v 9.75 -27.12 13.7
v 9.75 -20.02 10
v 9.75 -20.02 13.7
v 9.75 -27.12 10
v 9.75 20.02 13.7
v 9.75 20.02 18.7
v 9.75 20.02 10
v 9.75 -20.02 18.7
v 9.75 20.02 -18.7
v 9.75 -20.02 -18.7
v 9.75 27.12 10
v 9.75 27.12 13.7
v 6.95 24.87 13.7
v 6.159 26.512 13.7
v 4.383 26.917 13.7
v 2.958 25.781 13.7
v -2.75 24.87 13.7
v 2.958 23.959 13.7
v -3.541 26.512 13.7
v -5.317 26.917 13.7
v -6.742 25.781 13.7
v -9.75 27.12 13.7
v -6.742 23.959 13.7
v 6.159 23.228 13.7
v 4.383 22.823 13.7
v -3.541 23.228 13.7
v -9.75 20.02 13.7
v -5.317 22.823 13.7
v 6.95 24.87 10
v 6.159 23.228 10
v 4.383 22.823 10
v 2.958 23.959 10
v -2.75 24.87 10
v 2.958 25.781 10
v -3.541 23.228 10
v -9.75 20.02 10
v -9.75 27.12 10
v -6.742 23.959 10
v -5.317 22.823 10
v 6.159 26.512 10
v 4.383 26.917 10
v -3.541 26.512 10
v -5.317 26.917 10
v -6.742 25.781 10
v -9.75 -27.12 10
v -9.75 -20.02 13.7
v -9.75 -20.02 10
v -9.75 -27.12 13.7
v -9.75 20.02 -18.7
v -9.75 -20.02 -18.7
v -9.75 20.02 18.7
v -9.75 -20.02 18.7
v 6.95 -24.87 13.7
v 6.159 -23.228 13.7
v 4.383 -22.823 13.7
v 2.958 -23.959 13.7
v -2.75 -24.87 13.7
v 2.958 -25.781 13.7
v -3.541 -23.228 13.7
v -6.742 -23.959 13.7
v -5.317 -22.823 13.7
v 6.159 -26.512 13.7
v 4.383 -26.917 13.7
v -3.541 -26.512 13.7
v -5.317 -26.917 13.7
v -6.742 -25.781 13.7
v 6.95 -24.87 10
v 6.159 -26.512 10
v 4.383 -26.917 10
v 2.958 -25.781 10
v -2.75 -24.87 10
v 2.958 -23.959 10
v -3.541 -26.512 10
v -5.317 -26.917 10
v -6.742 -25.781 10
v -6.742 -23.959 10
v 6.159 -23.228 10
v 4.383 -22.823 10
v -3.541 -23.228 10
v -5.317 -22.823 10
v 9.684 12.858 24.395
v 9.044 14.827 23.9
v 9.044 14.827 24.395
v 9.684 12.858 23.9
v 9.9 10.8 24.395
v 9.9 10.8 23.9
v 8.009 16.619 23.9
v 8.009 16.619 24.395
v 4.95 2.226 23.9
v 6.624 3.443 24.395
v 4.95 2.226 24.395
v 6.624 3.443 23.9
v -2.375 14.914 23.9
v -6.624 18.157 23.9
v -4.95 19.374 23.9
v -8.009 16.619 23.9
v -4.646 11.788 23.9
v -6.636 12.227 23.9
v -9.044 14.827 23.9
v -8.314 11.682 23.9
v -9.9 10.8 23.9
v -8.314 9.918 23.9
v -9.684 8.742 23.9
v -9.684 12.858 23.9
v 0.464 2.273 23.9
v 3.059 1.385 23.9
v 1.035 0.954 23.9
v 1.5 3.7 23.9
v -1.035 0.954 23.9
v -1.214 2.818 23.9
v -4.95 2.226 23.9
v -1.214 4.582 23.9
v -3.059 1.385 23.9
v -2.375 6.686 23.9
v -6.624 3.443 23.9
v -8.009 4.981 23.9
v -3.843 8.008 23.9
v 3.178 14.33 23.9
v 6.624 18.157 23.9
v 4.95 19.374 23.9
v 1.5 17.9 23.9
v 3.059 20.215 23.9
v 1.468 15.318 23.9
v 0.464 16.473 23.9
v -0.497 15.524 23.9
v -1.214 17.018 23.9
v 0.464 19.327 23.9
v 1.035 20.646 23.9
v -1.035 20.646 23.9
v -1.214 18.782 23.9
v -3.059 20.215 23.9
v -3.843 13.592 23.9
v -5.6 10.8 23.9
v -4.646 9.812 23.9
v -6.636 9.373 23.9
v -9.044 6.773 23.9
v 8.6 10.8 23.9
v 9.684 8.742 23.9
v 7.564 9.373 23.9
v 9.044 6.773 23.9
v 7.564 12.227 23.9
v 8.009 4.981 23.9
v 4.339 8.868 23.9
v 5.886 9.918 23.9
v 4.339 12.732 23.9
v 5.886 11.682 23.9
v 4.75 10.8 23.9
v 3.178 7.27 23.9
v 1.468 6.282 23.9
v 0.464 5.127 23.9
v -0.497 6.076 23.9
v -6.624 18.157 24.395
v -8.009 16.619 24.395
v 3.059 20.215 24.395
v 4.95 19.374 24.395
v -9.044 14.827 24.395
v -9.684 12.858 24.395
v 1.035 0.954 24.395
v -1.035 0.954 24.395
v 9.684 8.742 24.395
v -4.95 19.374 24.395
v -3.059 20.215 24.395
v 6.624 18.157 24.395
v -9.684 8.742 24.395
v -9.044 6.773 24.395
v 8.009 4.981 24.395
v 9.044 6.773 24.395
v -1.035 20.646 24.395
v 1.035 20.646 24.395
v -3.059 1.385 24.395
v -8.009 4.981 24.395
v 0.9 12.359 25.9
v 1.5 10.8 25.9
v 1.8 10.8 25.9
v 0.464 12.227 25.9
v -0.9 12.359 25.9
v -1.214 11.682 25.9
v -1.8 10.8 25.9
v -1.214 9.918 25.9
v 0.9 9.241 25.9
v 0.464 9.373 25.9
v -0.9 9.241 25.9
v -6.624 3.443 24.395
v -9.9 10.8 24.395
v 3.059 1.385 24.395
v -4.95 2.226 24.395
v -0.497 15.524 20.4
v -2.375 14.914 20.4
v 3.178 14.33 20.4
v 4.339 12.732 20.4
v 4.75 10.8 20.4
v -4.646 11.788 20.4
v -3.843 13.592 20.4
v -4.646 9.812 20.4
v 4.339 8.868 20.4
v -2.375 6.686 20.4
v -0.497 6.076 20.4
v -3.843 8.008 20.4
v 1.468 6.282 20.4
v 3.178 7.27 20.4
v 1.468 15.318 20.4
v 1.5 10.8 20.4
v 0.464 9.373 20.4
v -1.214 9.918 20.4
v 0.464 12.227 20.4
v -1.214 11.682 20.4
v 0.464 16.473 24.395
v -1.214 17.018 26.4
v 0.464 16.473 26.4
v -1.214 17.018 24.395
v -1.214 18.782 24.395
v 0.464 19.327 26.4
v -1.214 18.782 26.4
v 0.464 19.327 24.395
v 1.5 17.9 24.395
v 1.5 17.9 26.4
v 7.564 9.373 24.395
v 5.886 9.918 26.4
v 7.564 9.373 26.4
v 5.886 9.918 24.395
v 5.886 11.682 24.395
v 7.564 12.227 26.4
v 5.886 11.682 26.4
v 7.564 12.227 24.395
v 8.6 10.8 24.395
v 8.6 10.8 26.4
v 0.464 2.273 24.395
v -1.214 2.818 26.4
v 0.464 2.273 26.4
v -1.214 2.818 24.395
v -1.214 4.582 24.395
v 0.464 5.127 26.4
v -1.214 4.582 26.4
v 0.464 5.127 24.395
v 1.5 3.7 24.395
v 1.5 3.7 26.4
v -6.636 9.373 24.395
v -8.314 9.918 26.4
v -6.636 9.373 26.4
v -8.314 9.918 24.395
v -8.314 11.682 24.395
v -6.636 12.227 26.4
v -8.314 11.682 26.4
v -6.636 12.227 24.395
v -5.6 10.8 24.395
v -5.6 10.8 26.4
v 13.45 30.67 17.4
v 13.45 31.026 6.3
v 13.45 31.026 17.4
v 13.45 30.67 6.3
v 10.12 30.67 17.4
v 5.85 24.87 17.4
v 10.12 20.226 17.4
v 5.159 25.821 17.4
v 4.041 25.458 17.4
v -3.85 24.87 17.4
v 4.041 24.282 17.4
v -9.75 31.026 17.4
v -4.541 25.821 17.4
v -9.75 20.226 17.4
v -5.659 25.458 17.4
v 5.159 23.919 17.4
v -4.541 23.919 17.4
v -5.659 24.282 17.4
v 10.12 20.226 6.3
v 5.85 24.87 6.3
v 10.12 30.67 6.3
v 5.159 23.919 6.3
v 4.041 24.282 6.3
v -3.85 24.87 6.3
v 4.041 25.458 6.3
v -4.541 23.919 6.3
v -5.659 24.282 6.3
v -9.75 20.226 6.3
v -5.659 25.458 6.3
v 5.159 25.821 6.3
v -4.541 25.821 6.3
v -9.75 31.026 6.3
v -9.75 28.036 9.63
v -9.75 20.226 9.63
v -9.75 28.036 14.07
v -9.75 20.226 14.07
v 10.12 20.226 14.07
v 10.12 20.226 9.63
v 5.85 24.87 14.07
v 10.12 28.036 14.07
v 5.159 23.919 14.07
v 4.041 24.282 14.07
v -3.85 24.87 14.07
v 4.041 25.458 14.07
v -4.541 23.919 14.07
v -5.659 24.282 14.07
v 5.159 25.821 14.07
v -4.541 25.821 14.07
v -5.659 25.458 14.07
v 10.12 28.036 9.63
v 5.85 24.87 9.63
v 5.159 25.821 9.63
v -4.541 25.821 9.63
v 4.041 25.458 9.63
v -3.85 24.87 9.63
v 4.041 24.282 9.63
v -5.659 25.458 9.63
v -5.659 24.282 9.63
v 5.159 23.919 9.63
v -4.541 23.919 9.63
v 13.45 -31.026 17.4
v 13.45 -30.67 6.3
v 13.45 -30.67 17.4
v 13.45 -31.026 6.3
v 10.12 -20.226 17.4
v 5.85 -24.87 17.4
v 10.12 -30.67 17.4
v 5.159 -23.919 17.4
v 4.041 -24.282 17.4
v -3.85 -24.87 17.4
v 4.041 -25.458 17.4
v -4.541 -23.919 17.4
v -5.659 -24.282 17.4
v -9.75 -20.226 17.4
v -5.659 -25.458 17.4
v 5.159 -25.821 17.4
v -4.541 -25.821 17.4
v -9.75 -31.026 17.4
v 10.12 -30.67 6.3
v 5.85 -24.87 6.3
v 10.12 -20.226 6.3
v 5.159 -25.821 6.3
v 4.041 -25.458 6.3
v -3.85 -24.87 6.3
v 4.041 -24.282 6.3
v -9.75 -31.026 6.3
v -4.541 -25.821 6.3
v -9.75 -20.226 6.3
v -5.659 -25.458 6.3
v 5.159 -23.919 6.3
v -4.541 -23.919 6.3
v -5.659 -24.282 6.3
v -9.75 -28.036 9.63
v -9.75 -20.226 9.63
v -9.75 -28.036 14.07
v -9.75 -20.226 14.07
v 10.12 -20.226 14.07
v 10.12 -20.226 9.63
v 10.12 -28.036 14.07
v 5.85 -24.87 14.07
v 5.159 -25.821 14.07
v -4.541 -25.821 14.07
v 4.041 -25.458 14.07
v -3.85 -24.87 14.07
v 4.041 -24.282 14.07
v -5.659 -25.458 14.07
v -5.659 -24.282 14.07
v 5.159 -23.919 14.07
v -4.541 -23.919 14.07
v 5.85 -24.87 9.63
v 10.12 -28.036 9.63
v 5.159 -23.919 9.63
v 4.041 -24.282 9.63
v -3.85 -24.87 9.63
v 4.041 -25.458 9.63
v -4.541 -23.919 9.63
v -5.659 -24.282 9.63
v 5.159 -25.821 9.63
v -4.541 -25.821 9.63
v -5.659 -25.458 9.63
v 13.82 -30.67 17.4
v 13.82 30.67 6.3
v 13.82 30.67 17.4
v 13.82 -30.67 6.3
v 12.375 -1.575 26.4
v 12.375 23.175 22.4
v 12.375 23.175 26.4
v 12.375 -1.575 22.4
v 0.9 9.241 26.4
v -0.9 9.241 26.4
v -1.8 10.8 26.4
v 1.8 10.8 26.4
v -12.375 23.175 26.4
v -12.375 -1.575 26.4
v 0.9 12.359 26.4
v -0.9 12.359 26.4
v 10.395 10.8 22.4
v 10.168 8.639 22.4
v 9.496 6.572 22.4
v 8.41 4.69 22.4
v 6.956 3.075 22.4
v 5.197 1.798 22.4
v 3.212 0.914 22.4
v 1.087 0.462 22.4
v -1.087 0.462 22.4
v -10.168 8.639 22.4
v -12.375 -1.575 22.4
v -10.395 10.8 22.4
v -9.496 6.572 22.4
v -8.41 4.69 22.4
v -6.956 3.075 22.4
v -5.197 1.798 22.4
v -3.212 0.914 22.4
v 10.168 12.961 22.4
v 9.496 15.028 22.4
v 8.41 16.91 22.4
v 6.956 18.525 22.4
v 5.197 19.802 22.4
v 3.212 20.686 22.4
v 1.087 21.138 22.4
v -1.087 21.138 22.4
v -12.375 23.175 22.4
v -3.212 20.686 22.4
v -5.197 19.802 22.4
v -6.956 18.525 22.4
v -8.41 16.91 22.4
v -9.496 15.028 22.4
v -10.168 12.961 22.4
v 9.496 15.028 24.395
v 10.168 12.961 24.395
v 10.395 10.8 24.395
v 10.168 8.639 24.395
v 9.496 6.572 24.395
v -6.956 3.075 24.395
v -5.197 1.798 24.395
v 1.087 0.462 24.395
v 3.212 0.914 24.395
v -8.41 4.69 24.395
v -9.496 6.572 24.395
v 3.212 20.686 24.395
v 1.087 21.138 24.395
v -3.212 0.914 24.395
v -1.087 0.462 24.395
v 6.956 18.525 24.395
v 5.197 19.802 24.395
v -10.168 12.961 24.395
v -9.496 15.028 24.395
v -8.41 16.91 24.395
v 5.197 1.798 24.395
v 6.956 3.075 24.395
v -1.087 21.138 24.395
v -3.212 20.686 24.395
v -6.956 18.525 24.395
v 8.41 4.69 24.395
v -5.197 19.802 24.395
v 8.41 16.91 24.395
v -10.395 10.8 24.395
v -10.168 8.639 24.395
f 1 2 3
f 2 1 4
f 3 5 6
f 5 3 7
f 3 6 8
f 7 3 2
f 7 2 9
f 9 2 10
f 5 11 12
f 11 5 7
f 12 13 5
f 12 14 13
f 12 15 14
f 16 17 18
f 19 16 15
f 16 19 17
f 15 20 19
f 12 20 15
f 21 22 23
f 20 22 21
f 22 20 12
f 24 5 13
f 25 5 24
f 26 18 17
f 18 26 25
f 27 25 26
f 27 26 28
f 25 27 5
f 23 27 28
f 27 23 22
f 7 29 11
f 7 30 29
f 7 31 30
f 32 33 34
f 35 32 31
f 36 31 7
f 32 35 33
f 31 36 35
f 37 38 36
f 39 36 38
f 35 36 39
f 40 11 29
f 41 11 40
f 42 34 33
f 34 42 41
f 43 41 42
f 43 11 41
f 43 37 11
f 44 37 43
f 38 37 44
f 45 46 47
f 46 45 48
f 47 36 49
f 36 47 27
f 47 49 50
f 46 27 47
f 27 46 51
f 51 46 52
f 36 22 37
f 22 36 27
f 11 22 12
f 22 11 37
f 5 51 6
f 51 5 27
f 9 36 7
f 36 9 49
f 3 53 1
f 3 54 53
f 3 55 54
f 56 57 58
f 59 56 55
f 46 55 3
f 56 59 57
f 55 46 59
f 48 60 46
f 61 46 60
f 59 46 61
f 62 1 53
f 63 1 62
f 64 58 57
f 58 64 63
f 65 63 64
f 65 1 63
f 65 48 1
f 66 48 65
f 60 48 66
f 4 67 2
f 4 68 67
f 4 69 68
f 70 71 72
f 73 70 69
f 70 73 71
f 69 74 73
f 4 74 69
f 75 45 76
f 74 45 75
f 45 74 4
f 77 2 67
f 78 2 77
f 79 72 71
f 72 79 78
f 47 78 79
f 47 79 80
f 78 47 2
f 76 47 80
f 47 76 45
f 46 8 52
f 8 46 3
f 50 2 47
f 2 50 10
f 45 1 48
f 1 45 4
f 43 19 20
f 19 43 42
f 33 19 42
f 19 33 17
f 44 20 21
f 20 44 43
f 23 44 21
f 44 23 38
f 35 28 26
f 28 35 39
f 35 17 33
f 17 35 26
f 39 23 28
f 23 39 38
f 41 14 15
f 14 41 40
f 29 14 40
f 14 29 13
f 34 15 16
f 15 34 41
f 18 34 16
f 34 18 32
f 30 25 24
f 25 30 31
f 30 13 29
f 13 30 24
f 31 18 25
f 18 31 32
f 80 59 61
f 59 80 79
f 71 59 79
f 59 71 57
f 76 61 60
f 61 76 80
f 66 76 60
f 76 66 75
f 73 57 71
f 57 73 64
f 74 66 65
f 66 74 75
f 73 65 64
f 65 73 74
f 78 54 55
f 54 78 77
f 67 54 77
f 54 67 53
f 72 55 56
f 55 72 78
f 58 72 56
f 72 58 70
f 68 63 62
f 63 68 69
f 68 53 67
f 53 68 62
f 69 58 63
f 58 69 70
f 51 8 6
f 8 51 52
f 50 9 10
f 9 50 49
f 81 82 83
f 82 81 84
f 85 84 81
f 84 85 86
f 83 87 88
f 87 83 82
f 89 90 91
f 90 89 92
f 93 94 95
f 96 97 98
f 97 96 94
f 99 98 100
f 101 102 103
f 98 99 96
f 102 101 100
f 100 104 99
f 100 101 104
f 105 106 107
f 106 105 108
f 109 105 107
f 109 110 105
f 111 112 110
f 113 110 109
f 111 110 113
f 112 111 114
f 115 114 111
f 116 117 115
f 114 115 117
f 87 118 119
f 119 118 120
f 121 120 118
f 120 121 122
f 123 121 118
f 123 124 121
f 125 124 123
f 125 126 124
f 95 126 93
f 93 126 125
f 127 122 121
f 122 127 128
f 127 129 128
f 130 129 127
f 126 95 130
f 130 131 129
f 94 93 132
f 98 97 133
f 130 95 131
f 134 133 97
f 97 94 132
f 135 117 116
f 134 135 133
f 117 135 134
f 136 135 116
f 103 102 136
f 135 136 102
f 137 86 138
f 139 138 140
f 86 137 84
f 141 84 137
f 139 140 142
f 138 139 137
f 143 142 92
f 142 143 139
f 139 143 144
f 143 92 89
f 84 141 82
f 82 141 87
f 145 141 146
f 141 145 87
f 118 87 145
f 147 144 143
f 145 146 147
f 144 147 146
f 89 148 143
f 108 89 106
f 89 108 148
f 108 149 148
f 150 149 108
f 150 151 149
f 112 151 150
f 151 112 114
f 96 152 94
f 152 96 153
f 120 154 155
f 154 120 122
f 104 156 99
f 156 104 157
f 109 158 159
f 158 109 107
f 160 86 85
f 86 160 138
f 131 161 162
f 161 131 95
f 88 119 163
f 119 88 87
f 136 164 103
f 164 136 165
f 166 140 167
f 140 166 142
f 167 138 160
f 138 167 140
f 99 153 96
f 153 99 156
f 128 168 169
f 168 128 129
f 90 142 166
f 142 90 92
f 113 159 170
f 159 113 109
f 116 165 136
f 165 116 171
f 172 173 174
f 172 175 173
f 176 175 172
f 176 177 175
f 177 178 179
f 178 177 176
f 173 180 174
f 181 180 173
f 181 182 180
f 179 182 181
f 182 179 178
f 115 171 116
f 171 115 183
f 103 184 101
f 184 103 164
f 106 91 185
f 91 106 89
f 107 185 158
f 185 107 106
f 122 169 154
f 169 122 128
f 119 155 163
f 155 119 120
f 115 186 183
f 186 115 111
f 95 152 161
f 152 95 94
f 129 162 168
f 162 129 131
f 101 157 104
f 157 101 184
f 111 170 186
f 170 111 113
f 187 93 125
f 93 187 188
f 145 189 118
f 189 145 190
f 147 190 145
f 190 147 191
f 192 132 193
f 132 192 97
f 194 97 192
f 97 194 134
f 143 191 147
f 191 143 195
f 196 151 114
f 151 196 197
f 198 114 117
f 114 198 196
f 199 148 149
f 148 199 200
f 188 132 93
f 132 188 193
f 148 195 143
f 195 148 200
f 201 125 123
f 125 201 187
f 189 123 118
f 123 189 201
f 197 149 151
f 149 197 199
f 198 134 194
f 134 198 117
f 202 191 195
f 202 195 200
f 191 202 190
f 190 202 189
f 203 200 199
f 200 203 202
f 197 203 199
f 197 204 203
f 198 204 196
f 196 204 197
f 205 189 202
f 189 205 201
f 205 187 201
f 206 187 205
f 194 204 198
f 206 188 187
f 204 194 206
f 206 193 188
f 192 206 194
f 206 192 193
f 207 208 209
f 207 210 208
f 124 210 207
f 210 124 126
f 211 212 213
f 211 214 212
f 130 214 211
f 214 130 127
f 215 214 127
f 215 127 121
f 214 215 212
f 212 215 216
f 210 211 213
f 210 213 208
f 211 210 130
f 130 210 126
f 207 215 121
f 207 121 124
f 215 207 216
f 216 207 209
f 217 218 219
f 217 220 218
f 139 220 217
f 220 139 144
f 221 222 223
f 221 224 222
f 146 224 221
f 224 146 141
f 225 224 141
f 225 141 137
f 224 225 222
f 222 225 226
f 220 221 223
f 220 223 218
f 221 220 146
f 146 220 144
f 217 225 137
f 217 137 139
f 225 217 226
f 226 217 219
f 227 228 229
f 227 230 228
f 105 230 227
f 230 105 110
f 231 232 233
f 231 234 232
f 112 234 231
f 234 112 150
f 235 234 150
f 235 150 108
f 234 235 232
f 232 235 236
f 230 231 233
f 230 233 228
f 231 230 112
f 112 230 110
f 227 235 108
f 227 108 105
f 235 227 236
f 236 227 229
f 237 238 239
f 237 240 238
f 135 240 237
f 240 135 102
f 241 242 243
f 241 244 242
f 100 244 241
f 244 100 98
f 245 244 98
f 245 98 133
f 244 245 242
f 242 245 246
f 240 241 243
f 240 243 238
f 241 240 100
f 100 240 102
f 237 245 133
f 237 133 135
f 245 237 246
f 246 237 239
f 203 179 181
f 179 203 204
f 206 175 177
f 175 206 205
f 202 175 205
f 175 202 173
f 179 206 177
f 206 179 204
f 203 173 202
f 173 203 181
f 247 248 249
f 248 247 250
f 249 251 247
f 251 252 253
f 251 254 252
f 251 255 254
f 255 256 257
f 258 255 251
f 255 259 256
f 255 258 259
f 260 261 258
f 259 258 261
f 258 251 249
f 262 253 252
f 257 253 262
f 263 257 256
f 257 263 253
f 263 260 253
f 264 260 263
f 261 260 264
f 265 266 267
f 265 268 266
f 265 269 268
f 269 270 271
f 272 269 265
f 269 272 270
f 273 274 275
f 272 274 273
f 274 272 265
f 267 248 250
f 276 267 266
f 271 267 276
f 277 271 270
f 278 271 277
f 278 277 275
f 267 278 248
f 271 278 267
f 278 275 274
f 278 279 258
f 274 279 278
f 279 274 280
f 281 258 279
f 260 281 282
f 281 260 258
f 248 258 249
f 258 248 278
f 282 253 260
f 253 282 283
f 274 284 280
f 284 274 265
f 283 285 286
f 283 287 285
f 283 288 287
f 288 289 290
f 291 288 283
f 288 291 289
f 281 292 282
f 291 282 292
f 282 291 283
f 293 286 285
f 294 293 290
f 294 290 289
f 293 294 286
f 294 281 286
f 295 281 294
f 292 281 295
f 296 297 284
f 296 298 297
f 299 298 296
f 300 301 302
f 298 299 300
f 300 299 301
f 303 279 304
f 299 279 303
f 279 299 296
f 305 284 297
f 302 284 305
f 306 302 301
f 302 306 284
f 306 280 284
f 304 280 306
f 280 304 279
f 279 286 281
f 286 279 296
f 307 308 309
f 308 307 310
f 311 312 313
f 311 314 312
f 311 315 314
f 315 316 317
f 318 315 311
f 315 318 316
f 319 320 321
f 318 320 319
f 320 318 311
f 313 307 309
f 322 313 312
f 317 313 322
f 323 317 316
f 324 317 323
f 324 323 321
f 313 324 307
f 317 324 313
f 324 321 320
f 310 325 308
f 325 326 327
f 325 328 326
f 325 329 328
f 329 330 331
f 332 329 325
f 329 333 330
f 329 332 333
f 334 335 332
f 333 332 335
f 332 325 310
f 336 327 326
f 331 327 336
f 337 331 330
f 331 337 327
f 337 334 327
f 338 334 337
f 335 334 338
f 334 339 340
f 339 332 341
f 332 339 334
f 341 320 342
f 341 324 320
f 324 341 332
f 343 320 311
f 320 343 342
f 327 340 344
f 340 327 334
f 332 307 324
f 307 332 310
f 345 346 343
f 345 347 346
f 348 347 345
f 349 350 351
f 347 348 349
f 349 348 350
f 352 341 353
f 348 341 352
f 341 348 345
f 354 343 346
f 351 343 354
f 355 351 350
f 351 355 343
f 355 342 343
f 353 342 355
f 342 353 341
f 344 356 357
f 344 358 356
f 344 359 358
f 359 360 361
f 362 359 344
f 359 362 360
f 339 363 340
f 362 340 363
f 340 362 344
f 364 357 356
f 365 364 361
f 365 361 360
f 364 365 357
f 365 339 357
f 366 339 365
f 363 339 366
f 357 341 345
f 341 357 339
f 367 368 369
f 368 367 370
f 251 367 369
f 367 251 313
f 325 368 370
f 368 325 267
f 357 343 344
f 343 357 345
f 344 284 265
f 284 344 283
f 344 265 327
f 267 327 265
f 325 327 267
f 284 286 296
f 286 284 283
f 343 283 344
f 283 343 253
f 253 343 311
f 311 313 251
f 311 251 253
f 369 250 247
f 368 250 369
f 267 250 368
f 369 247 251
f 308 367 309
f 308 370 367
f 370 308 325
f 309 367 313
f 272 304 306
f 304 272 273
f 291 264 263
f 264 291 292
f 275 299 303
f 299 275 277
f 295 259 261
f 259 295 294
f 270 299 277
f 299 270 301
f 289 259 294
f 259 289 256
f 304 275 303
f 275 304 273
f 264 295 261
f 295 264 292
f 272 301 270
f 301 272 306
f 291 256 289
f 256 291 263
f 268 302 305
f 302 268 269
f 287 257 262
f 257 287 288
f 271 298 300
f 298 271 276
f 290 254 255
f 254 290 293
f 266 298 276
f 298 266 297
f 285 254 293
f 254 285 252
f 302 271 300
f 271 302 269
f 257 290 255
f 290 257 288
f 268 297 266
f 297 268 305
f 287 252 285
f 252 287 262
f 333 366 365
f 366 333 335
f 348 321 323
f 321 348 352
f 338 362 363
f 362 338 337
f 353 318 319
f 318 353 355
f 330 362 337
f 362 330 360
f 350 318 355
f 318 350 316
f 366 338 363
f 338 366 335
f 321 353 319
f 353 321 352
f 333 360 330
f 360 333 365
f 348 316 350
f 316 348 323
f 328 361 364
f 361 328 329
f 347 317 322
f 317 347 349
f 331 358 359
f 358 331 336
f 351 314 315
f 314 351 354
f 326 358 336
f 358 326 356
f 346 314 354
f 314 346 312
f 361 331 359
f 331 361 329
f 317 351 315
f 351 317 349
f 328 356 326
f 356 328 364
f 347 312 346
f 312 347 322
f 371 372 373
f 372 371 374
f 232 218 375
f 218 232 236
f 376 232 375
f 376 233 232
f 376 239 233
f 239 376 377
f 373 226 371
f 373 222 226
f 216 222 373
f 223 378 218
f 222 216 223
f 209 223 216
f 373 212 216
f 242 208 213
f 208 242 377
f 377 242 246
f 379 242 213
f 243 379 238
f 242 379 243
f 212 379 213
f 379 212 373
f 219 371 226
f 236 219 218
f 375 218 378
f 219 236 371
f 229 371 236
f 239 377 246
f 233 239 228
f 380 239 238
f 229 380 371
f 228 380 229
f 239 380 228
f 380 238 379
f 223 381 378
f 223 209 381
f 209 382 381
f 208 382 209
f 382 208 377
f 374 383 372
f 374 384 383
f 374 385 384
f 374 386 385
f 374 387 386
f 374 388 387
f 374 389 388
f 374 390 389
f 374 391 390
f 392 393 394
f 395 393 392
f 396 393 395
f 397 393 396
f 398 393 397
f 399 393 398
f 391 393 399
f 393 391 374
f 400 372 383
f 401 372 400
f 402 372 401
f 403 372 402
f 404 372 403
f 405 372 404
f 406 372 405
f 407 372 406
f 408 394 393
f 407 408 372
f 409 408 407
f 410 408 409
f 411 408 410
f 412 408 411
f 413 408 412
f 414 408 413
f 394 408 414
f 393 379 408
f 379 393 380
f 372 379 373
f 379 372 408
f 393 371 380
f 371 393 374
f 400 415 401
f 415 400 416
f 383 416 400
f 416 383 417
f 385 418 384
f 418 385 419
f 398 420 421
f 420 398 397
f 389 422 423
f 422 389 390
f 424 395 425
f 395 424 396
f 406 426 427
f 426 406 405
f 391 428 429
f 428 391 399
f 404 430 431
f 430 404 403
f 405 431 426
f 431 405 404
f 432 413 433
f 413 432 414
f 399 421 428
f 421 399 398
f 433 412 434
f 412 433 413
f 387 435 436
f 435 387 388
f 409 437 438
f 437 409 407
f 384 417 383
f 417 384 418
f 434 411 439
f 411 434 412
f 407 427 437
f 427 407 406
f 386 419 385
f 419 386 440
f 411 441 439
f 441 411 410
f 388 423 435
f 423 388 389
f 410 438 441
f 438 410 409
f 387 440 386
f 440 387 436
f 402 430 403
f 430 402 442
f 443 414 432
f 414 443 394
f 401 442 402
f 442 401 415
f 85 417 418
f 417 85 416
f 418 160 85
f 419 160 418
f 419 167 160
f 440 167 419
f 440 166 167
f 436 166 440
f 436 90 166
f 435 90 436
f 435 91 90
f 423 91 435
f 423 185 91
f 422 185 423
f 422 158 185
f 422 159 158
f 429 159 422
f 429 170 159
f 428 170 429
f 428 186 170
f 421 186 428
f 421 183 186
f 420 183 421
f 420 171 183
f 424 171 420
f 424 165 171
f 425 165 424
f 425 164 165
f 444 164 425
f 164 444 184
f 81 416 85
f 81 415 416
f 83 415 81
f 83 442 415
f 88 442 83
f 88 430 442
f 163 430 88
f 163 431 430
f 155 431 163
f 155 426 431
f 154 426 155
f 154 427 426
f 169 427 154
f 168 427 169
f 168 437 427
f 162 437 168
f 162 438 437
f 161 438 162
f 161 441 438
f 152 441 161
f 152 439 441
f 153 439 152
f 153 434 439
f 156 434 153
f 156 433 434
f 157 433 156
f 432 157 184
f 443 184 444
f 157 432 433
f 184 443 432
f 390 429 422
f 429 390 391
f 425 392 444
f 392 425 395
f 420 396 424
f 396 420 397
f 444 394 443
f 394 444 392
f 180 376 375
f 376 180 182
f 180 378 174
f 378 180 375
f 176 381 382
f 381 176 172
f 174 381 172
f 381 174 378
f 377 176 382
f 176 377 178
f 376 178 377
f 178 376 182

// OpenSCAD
// file: motor-mg995-config.scad
/* "Resolution" of arcs */
if(str($qual) != "undef"){
  $fn = $qual;
}else{
  $fn = 64;
}
/* Constants in mm */
BODY_WIDTH = 19.5;
BODY_HEIGHT = 37.4;
BODY_DEPTH = 40.04;
HORN_DIAM = 19.8;
HORN_HEIGHT = 2.0;
HORN_HEIGHT_WHOLE = 5.5;
HORN_SCREW_MOUNT_DIAM = 9.5;
HORN_SCREW_HOLE_DIAM = 3.0;
HORN_SCREW_OFFSET = 7.1;
HORN_DEPTH_OFFSET = 10.8;
HORN_HEIGHT_OFFSET = 8.4;
MOUNT_HEIGHT = 3.7;
MOUNT_DEPTH = 7.1;
MOUNT_OFFSET_BOTTOM = 27.4;
MOUNT_HOLE_OFFSET_Y = 2.6;
MOUNT_HOLE_DIFF_X = 9.7;
MOUNT_HOLE_DIAM = 4.2;
MOUNT_SCREW_DIAM = 2.0;
/* Plastic colour */
PRINT_COLOR = [0.2, 0.2, 0.2];
// file: motor-mg995-horn-mount.scad
include <motor-mg995-config.scad>

module external_horn(horn_radius, horn_height, horn_height_whole, horn_screw_mount_radius){
  difference(){
    cube([horn_radius * 2.5, horn_radius * 2.5, horn_height * 2], true);
    translate([0, 0, -horn_height / 1.99]){
      cylinder(horn_height, horn_radius * 1.05, horn_radius * 1.05, true);
    }
  }
}

module external_horn_holes(screw_radius, screw_offset, horn_height){
    /* North screw hole */
  translate([0, screw_offset, 0]){
    cylinder(horn_height * 4, screw_radius, screw_radius, true);
  }
  /* East screw hole */
  translate([screw_offset, 0, 0]){
    cylinder(horn_height * 4, screw_radius, screw_radius, true);
  }
  /* South screw hole */
  translate([0, -screw_offset, 0]){
    cylinder(horn_height * 4, screw_radius, screw_radius, true);
  }
  /* West screw hole */
  translate([-screw_offset, 0, 0]){
    cylinder(horn_height * 4, screw_radius, screw_radius, true);
  }
  /* Center screw hole */
  translate([0, 0, 0]){
    cylinder(horn_height * 8, screw_radius * 1.2, screw_radius * 1.2, true);
  }
}

module motor_mg995_horn_mount(){
  /* Apply global properties */
  color(PRINT_COLOR){
    translate([0, 0, HORN_HEIGHT / 4]){
      difference(){
        external_horn(HORN_DIAM / 2, HORN_HEIGHT, HORN_HEIGHT_WHOLE, HORN_SCREW_MOUNT_DIAM / 2);
        external_horn_holes(HORN_SCREW_HOLE_DIAM / 2, HORN_SCREW_OFFSET, HORN_HEIGHT);
      }
    }
  }
}

module offset_motor_mg995_horn_mount(){
  translate([0, HORN_DEPTH_OFFSET, (BODY_HEIGHT + HORN_HEIGHT + HORN_HEIGHT_OFFSET) / 2]){
    motor_mg995_horn_mount();
  }
}

offset_motor_mg995_horn_mount();
// file: motor-mg995-body-mount.scad
include <motor-mg995-config.scad>
use <motor-mg995-body.scad>

module external_body_mounts(mount_width, mount_height, mount_depth, mount_offset, mount_hole_offset_y){
  /* North mount */
  translate([mount_height / 2, mount_hole_offset_y + (mount_height / 1.8), mount_offset]){
    difference(){
      cube([mount_width + mount_height, mount_depth + mount_height, mount_height * 3], true);
      translate([0, -mount_height / 2, 0]){
        cube([mount_width * 2, mount_depth * 1.2, mount_height * 1.2], true);
      }
    }
  }
  /* South mount */
  translate([mount_height / 2, -mount_hole_offset_y + (-mount_height / 1.8), mount_offset]){
    difference(){
      cube([mount_width + mount_height, mount_depth + mount_height, mount_height * 3], true);
      translate([0, mount_height / 2, 0]){
        cube([mount_width * 2, mount_depth * 1.2, mount_height * 1.2], true);
      }
    }
  }
  translate([(mount_width + (mount_height * 1.2)) / 2, 0, mount_offset]){
    cube([mount_height, BODY_DEPTH + (mount_depth * 3), mount_height * 3], true);
  }
}

module external_body_mount_holes(screw_height, screw_radius, screw_offset_x, screw_offset_y, mount_offset){
  /* North mount left */
  translate([-screw_offset_x, screw_offset_y, mount_offset]){
    cylinder(screw_height * 8, screw_radius, screw_radius, true);
  }
  /* North mount right */
  translate([screw_offset_x, screw_offset_y, mount_offset]){
    cylinder(screw_height * 8, screw_radius, screw_radius, true);
  }
  /* South mount left */
  translate([-screw_offset_x, -screw_offset_y, mount_offset]){
    cylinder(screw_height * 8, screw_radius, screw_radius, true);
  }
  /* South mount right */
  translate([screw_offset_x, -screw_offset_y, mount_offset]){
    cylinder(screw_height * 8, screw_radius, screw_radius, true);
  }
}

module motor_mg995_body_mount(){
  /* Apply global properties */
  color(PRINT_COLOR){
    translate([0, 0, BODY_DEPTH / 2]){
      union(){
        difference(){
          external_body_mounts(BODY_WIDTH, MOUNT_HEIGHT, MOUNT_DEPTH, (MOUNT_OFFSET_BOTTOM - MOUNT_HEIGHT) / 2, (MOUNT_DEPTH + BODY_DEPTH) / 2);
          external_body_mount_holes(MOUNT_HEIGHT, MOUNT_SCREW_DIAM / 2, MOUNT_HOLE_DIFF_X / 2, ((BODY_DEPTH + MOUNT_DEPTH + MOUNT_HOLE_OFFSET_Y) / 2), (MOUNT_OFFSET_BOTTOM - MOUNT_HEIGHT) / 2);
        }
      }
    }
  }
}

module offset_motor_mg995_body_mount(){
  translate([0, 0, BODY_DEPTH / -2]){
    motor_mg995_body_mount();
  }
}

#offset_motor_mg995_body();
offset_motor_mg995_body_mount();
// file: motor-mg995-horn.scad
include <motor-mg995-config.scad>

module horn(horn_radius, horn_height, horn_height_whole, horn_screw_mount_radius){
  cylinder(horn_height, horn_radius, horn_radius, true);
  translate([0, 0, -(horn_height_whole) / 2]){
    cylinder(horn_height_whole - horn_height, horn_screw_mount_radius, horn_screw_mount_radius, true);
  }
}

module horn_holes(screw_radius, screw_offset, horn_height){
  /* North screw hole */
  translate([0, screw_offset, 0]){
    cylinder(horn_height * 1.01, screw_radius, screw_radius, true);
  }
  /* East screw hole */
  translate([screw_offset, 0, 0]){
    cylinder(horn_height * 1.01, screw_radius, screw_radius, true);
  }
  /* South screw hole */
  translate([0, -screw_offset, 0]){
    cylinder(horn_height * 1.01, screw_radius, screw_radius, true);
  }
  /* West screw hole */
  translate([-screw_offset, 0, 0]){
    cylinder(horn_height * 1.01, screw_radius, screw_radius, true);
  }
  /* Center screw hole */
  translate([0, 0, 0]){
    cylinder(horn_height * 8, screw_radius, screw_radius, true);
  }
}

module motor_mg995_horn(){
  /* Apply global properties */
  color(PRINT_COLOR){
    translate([0, 0, HORN_HEIGHT / 2]){
      difference(){
        horn(HORN_DIAM / 2, HORN_HEIGHT, HORN_HEIGHT_WHOLE, HORN_SCREW_MOUNT_DIAM / 2);
        horn_holes(HORN_SCREW_HOLE_DIAM / 2, HORN_SCREW_OFFSET, HORN_HEIGHT);
      }
    }
  }
}

module offset_motor_mg995_horn(){
  translate([0, HORN_DEPTH_OFFSET, (BODY_HEIGHT + HORN_HEIGHT + HORN_HEIGHT_OFFSET) / 2]){
    motor_mg995_horn();
  }
}

offset_motor_mg995_horn();
// file: motor-mg995-body.scad
include <motor-mg995-config.scad>

module body(body_width, body_height, body_depth){
  cube([body_width, body_depth, body_height], true);
}

module body_mounts(mount_width, mount_height, mount_depth, mount_offset, mount_hole_offset_y){
  /* North mount */
  translate([0, mount_hole_offset_y, mount_offset]){
    cube([mount_width, mount_depth, mount_height], true);
  }
  /* South mount */
  translate([0, -mount_hole_offset_y, mount_offset]){
    cube([mount_width, mount_depth, mount_height], true);
  }
}

module body_mount_holes(screw_height, screw_radius, screw_offset_x, screw_offset_y, mount_offset){
  /* North mount left */
  translate([-screw_offset_x, screw_offset_y, mount_offset]){
    cylinder(screw_height * 1.01, screw_radius, screw_radius, true);
  }
  /* North mount right */
  translate([screw_offset_x, screw_offset_y, mount_offset]){
    cylinder(screw_height * 1.01, screw_radius, screw_radius, true);
  }
  /* South mount left */
  translate([-screw_offset_x, -screw_offset_y, mount_offset]){
    cylinder(screw_height * 1.01, screw_radius, screw_radius, true);
  }
  /* South mount right */
  translate([screw_offset_x, -screw_offset_y, mount_offset]){
    cylinder(screw_height * 1.01, screw_radius, screw_radius, true);
  }
}

module motor_mg995_body(){
  /* Apply global properties */
  color(PRINT_COLOR){
    translate([0, 0, BODY_DEPTH / 2]){
      union(){
        body(BODY_WIDTH, BODY_HEIGHT, BODY_DEPTH);
        difference(){
          body_mounts(BODY_WIDTH, MOUNT_HEIGHT, MOUNT_DEPTH, (MOUNT_OFFSET_BOTTOM - MOUNT_HEIGHT) / 2, (MOUNT_DEPTH + BODY_DEPTH) / 2);
          body_mount_holes(MOUNT_HEIGHT, MOUNT_HOLE_DIAM / 2, MOUNT_HOLE_DIFF_X / 2, ((BODY_DEPTH + MOUNT_DEPTH + MOUNT_HOLE_OFFSET_Y) / 2), (MOUNT_OFFSET_BOTTOM - MOUNT_HEIGHT) / 2);
        }
      }
    }
  }
}

module offset_motor_mg995_body(){
  translate([0, 0, BODY_DEPTH / -2]){
    motor_mg995_body();
  }
}

offset_motor_mg995_body();
// main file
use <motor-mg995-body.scad>
use <motor-mg995-horn.scad>
use <motor-mg995-body-mount.scad>
use <motor-mg995-horn-mount.scad>

module motor_mg995_complete(){
  union(){
    offset_motor_mg995_body();
    offset_motor_mg995_horn();
    offset_motor_mg995_body_mount();
    offset_motor_mg995_horn_mount();
  }
}

module motor_mg995_rotate(){
  rotate([0, 0, $t * 360]){
    motor_mg995_complete();
  }
}

motor_mg995_rotate();
